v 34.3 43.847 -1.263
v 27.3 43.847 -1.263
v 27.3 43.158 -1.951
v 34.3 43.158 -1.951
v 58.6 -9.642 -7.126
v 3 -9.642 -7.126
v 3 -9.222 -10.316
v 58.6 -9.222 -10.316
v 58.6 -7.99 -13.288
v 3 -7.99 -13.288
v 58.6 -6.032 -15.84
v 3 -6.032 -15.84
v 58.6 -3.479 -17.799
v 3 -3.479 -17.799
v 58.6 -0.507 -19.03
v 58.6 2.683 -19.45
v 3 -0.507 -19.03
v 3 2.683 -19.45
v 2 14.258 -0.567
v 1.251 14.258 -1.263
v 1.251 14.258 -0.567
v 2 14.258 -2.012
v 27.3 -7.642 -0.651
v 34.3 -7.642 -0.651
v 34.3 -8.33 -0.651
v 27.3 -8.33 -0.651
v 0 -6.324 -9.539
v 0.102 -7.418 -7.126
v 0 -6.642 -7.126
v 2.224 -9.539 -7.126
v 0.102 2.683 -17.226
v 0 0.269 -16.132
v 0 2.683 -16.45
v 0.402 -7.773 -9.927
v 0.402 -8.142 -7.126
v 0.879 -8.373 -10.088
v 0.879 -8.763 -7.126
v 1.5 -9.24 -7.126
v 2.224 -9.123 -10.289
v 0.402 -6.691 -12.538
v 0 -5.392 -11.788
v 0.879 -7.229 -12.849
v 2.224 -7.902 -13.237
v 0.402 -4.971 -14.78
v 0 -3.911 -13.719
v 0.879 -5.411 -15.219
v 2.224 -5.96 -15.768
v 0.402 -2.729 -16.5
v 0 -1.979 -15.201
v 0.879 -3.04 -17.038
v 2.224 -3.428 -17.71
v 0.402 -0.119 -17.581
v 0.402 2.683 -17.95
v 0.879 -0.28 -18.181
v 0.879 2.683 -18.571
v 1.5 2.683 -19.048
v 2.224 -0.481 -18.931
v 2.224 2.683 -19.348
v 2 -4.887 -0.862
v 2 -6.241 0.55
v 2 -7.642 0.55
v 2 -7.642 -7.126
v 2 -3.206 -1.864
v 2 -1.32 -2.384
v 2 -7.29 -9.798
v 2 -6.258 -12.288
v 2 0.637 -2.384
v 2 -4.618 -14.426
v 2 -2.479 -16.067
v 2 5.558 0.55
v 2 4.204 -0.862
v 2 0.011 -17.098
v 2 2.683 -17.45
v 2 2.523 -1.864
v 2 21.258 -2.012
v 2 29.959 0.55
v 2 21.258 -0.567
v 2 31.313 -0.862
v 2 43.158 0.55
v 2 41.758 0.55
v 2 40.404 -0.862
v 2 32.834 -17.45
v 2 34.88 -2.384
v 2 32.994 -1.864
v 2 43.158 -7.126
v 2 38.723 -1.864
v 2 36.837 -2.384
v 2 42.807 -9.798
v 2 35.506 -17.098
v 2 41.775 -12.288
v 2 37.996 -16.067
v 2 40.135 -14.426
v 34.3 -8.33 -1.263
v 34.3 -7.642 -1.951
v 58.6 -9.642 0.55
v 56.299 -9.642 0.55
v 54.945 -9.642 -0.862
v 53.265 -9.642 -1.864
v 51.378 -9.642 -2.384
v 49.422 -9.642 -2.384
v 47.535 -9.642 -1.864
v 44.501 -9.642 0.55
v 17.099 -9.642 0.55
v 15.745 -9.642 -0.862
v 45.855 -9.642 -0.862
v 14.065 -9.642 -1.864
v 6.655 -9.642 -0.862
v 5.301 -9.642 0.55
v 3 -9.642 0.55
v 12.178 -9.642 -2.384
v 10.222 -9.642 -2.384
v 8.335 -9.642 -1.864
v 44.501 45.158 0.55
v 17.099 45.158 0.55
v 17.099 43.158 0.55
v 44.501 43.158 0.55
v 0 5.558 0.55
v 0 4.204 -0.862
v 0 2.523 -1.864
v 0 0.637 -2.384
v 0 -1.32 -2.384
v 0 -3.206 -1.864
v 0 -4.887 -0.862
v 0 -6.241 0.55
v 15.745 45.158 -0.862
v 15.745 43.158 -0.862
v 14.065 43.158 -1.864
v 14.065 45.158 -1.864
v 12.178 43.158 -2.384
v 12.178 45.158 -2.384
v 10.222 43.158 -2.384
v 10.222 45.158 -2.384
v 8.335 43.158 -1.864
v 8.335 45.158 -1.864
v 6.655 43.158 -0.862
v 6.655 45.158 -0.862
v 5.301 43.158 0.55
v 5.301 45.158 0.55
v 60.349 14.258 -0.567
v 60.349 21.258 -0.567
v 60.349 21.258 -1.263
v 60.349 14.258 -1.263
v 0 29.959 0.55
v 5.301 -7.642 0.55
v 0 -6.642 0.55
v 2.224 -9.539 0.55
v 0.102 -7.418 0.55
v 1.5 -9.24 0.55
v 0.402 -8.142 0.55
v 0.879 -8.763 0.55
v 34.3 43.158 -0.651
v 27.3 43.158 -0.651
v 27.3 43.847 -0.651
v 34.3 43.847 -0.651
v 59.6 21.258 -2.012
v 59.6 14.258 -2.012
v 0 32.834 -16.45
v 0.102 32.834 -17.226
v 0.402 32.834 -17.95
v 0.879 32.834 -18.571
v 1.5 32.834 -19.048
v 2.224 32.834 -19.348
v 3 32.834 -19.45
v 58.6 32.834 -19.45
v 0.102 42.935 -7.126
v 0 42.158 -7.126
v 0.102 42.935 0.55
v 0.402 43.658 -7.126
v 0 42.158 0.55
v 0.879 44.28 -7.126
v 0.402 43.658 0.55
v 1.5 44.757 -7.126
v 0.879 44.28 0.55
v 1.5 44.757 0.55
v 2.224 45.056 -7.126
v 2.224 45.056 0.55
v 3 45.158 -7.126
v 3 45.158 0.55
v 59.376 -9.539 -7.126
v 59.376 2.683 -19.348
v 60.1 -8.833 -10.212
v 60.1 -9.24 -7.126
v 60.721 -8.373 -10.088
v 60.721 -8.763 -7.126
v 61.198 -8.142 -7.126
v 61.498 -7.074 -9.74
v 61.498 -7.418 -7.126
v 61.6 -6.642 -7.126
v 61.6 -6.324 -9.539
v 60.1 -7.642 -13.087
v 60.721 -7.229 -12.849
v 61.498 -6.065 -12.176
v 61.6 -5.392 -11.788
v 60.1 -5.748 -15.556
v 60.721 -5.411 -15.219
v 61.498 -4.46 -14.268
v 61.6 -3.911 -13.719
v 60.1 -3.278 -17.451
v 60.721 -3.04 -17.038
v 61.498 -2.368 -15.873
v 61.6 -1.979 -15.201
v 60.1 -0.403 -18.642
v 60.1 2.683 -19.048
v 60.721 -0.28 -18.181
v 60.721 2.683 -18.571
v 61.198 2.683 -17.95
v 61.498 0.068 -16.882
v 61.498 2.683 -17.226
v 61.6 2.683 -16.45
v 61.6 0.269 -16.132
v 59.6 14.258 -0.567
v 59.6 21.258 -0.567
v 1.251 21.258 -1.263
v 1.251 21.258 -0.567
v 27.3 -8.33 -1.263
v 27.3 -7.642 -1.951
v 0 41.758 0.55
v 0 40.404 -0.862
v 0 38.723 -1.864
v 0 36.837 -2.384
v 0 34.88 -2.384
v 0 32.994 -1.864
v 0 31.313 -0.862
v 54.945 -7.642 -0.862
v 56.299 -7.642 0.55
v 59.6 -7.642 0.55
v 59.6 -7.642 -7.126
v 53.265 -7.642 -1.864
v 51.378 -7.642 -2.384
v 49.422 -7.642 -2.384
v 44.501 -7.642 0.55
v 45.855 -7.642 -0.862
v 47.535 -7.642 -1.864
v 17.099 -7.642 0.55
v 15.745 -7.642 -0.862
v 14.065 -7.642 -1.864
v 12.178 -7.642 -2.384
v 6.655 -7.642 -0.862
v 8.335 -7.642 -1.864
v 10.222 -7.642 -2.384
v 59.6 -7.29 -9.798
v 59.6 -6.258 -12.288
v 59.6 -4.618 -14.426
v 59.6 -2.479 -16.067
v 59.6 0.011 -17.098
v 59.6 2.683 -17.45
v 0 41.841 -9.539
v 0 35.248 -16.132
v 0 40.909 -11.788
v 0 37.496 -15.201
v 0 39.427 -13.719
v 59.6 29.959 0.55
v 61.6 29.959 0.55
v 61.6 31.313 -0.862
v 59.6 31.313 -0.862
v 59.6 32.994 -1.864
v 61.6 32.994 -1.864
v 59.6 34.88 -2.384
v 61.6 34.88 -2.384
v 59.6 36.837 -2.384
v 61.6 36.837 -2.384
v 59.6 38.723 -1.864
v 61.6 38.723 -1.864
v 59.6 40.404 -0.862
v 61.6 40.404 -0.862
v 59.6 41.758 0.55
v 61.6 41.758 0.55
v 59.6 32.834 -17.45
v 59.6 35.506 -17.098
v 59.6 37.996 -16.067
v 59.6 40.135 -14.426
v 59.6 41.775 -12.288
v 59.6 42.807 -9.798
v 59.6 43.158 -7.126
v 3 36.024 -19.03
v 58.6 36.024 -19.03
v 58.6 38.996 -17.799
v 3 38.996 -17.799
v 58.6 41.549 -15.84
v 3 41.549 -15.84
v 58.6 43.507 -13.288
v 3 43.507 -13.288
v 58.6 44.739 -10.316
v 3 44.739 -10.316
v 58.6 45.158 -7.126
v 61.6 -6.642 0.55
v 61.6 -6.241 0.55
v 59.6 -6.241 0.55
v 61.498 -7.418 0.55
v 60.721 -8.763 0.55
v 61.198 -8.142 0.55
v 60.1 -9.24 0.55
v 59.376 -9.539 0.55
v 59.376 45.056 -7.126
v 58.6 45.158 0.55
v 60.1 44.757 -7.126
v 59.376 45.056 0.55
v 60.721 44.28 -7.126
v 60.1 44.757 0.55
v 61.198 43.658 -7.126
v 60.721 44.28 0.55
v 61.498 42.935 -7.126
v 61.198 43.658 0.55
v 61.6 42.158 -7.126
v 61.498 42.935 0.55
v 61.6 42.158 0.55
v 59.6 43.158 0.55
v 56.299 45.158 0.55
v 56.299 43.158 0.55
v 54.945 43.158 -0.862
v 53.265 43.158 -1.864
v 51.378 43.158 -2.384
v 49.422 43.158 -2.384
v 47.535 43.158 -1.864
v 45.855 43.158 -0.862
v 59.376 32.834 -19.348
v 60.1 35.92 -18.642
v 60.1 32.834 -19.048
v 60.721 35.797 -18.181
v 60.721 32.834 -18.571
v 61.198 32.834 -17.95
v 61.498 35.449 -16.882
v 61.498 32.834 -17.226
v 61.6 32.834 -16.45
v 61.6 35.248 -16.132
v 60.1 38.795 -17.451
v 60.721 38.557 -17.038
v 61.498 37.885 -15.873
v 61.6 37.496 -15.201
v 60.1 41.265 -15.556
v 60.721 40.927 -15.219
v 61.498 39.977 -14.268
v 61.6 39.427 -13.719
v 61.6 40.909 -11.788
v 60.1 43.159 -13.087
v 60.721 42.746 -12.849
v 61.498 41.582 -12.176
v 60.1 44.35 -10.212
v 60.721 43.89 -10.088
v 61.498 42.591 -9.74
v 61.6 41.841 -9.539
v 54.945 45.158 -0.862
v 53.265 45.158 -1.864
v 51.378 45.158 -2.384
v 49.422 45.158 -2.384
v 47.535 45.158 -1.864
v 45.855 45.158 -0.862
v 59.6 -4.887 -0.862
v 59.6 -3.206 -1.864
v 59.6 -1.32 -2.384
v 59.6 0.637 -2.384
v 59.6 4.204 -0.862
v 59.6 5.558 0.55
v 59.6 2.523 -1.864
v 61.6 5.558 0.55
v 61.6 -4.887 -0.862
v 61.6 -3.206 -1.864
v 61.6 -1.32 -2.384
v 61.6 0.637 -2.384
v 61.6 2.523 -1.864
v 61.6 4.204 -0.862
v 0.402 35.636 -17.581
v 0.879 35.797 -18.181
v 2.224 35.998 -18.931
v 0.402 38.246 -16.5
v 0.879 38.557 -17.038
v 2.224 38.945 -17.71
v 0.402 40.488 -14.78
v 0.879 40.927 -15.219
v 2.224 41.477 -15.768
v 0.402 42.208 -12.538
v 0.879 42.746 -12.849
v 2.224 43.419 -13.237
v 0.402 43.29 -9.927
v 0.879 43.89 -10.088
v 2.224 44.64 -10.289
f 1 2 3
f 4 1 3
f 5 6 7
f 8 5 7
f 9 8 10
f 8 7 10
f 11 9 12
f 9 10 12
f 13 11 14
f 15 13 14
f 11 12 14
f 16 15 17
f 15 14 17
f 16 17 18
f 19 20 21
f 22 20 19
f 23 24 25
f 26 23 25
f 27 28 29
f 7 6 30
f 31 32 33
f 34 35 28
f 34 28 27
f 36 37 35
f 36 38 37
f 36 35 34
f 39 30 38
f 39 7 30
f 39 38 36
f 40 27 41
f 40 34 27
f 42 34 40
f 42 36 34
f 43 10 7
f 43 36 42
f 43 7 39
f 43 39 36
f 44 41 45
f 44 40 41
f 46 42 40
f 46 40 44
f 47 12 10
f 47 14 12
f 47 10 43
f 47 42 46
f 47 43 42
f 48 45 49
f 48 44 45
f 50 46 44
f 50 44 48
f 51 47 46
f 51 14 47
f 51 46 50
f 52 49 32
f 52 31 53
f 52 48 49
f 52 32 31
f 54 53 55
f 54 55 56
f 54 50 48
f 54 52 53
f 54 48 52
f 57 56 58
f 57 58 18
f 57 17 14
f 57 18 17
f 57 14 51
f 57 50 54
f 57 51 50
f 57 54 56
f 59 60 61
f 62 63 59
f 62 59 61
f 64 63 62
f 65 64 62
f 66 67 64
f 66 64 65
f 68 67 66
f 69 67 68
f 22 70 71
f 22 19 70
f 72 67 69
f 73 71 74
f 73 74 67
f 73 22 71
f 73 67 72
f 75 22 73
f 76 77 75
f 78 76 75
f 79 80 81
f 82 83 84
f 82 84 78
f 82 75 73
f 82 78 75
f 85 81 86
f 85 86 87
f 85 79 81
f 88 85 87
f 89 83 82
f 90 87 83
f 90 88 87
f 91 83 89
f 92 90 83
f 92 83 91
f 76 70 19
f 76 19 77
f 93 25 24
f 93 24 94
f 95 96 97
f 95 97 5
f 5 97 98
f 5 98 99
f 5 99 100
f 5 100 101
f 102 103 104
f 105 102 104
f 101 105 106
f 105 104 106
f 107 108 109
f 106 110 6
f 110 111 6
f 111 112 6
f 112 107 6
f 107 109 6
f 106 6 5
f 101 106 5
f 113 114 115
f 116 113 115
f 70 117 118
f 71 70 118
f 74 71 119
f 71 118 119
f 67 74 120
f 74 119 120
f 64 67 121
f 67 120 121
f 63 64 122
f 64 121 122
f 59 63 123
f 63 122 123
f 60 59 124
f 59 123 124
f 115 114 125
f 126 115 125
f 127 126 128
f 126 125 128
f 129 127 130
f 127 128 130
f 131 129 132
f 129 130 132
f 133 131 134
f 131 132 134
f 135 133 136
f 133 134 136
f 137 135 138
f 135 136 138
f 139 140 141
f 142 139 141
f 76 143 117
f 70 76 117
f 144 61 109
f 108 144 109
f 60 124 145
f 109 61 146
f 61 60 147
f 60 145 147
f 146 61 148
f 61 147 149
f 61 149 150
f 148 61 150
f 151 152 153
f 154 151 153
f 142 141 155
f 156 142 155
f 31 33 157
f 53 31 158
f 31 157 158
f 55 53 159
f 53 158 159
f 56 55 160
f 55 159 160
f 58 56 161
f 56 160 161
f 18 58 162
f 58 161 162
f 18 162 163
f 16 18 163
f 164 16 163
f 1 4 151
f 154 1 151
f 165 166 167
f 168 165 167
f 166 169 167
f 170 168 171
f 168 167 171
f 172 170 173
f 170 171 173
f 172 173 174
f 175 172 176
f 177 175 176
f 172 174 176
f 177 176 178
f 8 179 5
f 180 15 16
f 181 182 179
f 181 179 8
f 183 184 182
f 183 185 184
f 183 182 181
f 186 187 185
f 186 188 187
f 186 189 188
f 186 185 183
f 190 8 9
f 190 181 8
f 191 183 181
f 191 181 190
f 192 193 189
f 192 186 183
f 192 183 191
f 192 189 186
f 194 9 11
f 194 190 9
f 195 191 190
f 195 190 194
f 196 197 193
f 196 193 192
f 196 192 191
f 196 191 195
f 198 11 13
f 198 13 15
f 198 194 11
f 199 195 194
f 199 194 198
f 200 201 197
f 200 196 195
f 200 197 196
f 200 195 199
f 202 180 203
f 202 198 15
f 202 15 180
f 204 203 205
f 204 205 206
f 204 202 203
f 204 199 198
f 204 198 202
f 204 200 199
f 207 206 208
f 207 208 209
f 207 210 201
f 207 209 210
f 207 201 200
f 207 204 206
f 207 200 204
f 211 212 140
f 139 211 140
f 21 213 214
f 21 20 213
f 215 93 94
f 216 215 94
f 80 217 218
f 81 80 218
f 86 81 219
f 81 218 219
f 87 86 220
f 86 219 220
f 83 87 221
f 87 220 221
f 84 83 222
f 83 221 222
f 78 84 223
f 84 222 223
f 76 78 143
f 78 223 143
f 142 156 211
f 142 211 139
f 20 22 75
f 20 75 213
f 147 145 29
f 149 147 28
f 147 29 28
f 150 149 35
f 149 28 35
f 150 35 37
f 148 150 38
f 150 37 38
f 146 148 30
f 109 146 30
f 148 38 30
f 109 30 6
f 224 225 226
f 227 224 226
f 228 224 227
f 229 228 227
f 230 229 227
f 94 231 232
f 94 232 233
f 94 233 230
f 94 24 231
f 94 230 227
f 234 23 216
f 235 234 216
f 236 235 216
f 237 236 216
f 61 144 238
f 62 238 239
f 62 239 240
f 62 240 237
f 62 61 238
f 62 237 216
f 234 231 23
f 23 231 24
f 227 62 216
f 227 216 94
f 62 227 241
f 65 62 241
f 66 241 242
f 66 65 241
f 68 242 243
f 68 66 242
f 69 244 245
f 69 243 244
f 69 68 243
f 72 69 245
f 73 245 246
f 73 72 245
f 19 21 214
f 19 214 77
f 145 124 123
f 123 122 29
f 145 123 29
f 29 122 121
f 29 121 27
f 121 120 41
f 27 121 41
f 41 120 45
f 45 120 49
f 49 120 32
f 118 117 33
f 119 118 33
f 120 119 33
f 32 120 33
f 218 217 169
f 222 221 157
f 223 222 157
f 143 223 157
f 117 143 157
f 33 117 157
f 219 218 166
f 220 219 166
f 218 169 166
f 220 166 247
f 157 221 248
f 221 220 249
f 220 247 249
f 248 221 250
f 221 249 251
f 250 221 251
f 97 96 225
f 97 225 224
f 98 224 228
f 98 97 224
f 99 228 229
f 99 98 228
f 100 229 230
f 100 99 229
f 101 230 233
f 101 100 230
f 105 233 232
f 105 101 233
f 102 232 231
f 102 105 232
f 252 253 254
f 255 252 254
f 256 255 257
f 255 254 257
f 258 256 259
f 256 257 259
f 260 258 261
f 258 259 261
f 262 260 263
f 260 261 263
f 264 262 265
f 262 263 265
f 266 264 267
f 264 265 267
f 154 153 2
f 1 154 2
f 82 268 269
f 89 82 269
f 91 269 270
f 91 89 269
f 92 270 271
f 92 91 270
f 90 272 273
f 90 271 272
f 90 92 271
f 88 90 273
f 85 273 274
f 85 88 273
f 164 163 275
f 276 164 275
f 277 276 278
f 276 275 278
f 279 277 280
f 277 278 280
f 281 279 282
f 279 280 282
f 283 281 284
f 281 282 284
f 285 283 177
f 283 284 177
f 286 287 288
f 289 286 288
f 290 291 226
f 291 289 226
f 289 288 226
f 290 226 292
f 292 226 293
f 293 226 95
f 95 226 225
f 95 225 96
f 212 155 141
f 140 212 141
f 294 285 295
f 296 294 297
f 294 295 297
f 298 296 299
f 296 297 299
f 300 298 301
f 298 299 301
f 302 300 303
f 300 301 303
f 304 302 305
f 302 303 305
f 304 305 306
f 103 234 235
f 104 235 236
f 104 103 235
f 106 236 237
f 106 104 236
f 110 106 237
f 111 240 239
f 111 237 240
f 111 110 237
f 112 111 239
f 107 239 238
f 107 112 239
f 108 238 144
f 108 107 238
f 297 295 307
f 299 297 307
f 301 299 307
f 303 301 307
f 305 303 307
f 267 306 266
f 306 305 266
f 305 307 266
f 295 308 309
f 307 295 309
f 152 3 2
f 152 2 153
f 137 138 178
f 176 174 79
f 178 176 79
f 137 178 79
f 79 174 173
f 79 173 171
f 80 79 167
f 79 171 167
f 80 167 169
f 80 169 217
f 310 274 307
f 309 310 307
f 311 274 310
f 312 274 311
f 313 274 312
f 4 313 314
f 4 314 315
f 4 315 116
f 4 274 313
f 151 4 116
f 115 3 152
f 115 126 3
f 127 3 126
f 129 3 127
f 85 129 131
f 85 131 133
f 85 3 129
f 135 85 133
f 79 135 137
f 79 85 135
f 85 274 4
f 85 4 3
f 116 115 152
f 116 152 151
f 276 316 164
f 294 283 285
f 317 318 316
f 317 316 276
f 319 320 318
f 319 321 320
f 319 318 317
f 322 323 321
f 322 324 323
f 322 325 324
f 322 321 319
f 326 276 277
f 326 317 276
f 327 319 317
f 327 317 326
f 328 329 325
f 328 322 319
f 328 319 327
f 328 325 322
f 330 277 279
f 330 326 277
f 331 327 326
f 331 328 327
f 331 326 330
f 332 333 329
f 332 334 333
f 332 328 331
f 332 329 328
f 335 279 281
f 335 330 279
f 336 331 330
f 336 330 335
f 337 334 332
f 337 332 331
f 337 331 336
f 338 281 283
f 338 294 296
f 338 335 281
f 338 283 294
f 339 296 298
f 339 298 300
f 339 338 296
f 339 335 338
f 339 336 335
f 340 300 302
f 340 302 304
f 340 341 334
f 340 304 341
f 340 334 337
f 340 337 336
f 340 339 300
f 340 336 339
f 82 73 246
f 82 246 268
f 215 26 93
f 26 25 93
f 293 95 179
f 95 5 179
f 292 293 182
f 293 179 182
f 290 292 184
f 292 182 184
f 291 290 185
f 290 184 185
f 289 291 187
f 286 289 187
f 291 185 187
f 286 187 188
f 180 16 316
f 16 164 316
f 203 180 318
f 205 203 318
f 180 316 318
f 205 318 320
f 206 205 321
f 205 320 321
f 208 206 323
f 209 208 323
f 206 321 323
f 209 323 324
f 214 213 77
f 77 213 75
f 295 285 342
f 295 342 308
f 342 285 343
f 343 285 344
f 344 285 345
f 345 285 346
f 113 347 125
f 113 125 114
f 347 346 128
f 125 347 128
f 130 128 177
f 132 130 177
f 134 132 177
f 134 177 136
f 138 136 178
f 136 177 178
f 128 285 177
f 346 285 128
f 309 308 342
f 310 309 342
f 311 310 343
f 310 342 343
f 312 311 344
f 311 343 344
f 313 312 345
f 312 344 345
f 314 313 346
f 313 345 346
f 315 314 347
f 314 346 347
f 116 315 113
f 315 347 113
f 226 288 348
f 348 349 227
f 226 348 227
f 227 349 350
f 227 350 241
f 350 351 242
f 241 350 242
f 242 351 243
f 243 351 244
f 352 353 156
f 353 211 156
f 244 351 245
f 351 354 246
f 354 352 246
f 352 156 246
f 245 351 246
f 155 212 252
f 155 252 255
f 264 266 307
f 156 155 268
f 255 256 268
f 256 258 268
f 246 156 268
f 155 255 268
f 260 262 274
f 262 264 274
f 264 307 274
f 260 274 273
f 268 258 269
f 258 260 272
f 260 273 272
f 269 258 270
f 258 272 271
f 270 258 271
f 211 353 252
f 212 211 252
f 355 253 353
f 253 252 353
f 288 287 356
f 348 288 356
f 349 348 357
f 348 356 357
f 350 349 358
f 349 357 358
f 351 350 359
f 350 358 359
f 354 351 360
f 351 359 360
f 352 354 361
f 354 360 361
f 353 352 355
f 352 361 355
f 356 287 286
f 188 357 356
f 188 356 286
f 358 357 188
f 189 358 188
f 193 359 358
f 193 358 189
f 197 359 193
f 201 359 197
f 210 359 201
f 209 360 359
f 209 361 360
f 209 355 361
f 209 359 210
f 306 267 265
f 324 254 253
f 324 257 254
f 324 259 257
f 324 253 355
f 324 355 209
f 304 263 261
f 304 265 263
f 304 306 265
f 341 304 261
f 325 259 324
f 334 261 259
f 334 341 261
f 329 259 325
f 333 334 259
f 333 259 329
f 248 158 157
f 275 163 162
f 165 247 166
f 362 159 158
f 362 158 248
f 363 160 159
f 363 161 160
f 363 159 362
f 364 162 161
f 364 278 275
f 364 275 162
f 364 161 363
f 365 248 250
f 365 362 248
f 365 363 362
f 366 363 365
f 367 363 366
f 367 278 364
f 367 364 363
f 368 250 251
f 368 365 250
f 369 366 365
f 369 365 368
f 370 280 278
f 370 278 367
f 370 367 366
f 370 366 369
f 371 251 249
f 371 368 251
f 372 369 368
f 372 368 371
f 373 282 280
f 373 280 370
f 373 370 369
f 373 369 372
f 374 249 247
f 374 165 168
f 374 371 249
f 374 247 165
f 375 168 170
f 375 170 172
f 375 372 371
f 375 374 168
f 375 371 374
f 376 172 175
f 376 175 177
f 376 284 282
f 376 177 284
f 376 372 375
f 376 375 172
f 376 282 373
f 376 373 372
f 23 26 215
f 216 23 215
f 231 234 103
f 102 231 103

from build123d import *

# Parameters (mm, degrees)
EXTRUDE_1_DEPTH      = 61.6
SHELL_1_T            = -2
CUT_EXTRUDE_8_DEPTH  = 3.5
CUT_EXTRUDE_9_REACH  = 80.817
CUT_EXTRUDE_10_REACH = 80.817
CUT_EXTRUDE_11_REACH = 86.711
CUT_EXTRUDE_12_REACH = 86.711
CUT_EXTRUDE_13_DEPTH = 3.5
FILLET_1_R           = 3
FILLET_2_R           = 3


with BuildPart() as part:
    # ｽｹｯﾁ2 → ﾎﾞｽ - 押し出し1 (new body)
    with BuildSketch(Plane(origin=(0, 0, 0), x_dir=(0, 0, -1), z_dir=(1, 0, 0))):
        with BuildLine():
            Line((7.125790142, 45.158487371), (-0.55, 45.158487371))
            Line((-0.55, 45.158487371), (-0.55, -9.641512629))
            Line((-0.55, -9.641512629), (7.125790142, -9.641512629))
            ThreePointArc((7.125790142, -9.641512629), (15.840322505, -6.031835134), (19.45, 2.682697229))
            Line((19.45, 2.682697229), (19.45, 32.834277513))
            ThreePointArc((19.45, 32.834277513), (15.840322505, 41.548809876), (7.125790142, 45.158487371))
        make_face()
    extrude(amount=EXTRUDE_1_DEPTH)

    # ｼｪﾙ1
    shell_1_openings = [part.faces().sort_by_distance(p)[0] for p in [
        (30.8, 17.758487371, 0.55),
    ]]
    offset(amount=SHELL_1_T, openings=shell_1_openings, kind=Kind.INTERSECTION)

    # ｽｹｯﾁ11 → ｶｯﾄ - 押し出し8 (cut, symmetric)
    with BuildSketch(Plane(origin=(0, 17.758487371, 0), x_dir=(1, 0, 0), z_dir=(0, 1, 0))):
        Polygon((2.16, 2.171540251), (1.251335836, 1.262876087), (1.251335836, 0.566601917), (2.16, 0.566601917), align=None)
        Polygon((59.44, 2.171540251), (59.44, 0.566601917), (60.348664164, 0.566601917), (60.348664164, 1.262876087), align=None)
    extrude(amount=CUT_EXTRUDE_8_DEPTH, both=True, mode=Mode.SUBTRACT)

    # ｽｹｯﾁ12 → ｶｯﾄ - 押し出し9 (cut, up to next)
    with BuildSketch(Plane(origin=(61.6, 0, 0), x_dir=(0, 0, -1), z_dir=(1, 0, 0)), mode=Mode.PRIVATE) as cut_extrude_9_sk1:
        with BuildLine():
            Line((-0.55, 41.757639853), (-0.55, 29.95933489))
            ThreePointArc((-0.55, 29.95933489), (2.45, 35.858487371), (-0.55, 41.757639853))
        make_face()
    cut_extrude_9_tool1 = extrude(cut_extrude_9_sk1.sketch, amount=-CUT_EXTRUDE_9_REACH, mode=Mode.PRIVATE) & part.part
    # ｽｹｯﾁ12 → ｶｯﾄ - 押し出し9 (cut, up to next)
    with BuildSketch(Plane(origin=(61.6, 0, 0), x_dir=(0, 0, -1), z_dir=(1, 0, 0)), mode=Mode.PRIVATE) as cut_extrude_9_sk2:
        with BuildLine():
            Line((-0.55, 5.557639853), (-0.55, -6.24066511))
            ThreePointArc((-0.55, -6.24066511), (2.45, -0.341512629), (-0.55, 5.557639853))
        make_face()
    cut_extrude_9_tool2 = extrude(cut_extrude_9_sk2.sketch, amount=-CUT_EXTRUDE_9_REACH, mode=Mode.PRIVATE) & part.part
    add(cut_extrude_9_tool1.solids().sort_by_distance((61.6, 35.858487, -0.674015))[0], mode=Mode.SUBTRACT)
    add(cut_extrude_9_tool2.solids().sort_by_distance((61.6, -0.341513, -0.674015))[0], mode=Mode.SUBTRACT)

    # ｽｹｯﾁ13 → ｶｯﾄ - 押し出し10 (cut, up to next)
    with BuildSketch(Plane.ZY, mode=Mode.PRIVATE) as cut_extrude_10_sk1:
        with BuildLine():
            Line((0.55, 29.95933489), (0.55, 41.757639853))
            ThreePointArc((0.55, 41.757639853), (-2.45, 35.858487371), (0.55, 29.95933489))
        make_face()
    cut_extrude_10_tool1 = extrude(cut_extrude_10_sk1.sketch, amount=-CUT_EXTRUDE_10_REACH, mode=Mode.PRIVATE) & part.part
    # ｽｹｯﾁ13 → ｶｯﾄ - 押し出し10 (cut, up to next)
    with BuildSketch(Plane.ZY, mode=Mode.PRIVATE) as cut_extrude_10_sk2:
        with BuildLine():
            Line((0.55, -6.24066511), (0.55, 5.557639853))
            ThreePointArc((0.55, 5.557639853), (-2.45, -0.341512629), (0.55, -6.24066511))
        make_face()
    cut_extrude_10_tool2 = extrude(cut_extrude_10_sk2.sketch, amount=-CUT_EXTRUDE_10_REACH, mode=Mode.PRIVATE) & part.part
    add(cut_extrude_10_tool1.solids().sort_by_distance((0, 35.858487, -0.674015))[0], mode=Mode.SUBTRACT)
    add(cut_extrude_10_tool2.solids().sort_by_distance((0, -0.341513, -0.674015))[0], mode=Mode.SUBTRACT)

    # ｽｹｯﾁ14 → ｶｯﾄ - 押し出し11 (cut, up to next)
    with BuildSketch(Plane.XZ.offset(9.641512629), mode=Mode.PRIVATE) as cut_extrude_11_sk1:
        with BuildLine():
            Line((5.300847518, 0.55), (17.099152482, 0.55))
            ThreePointArc((17.099152482, 0.55), (11.2, -2.45), (5.300847518, 0.55))
        make_face()
    cut_extrude_11_tool1 = extrude(cut_extrude_11_sk1.sketch, amount=-CUT_EXTRUDE_11_REACH, mode=Mode.PRIVATE) & part.part
    # ｽｹｯﾁ14 → ｶｯﾄ - 押し出し11 (cut, up to next)
    with BuildSketch(Plane.XZ.offset(9.641512629), mode=Mode.PRIVATE) as cut_extrude_11_sk2:
        with BuildLine():
            Line((44.500847518, 0.55), (56.299152482, 0.55))
            ThreePointArc((56.299152482, 0.55), (50.4, -2.45), (44.500847518, 0.55))
        make_face()
    cut_extrude_11_tool2 = extrude(cut_extrude_11_sk2.sketch, amount=-CUT_EXTRUDE_11_REACH, mode=Mode.PRIVATE) & part.part
    add(cut_extrude_11_tool1.solids().sort_by_distance((11.2, -9.641513, -0.674015))[0], mode=Mode.SUBTRACT)
    add(cut_extrude_11_tool2.solids().sort_by_distance((50.4, -9.641513, -0.674015))[0], mode=Mode.SUBTRACT)

    # ｽｹｯﾁ15 → ｶｯﾄ - 押し出し12 (cut, up to next)
    with BuildSketch(Plane(origin=(0, 45.158487371, 0), x_dir=(1, 0, 0), z_dir=(0, 1, 0)), mode=Mode.PRIVATE) as cut_extrude_12_sk1:
        with BuildLine():
            Line((44.500847518, -0.55), (56.299152482, -0.55))
            ThreePointArc((56.299152482, -0.55), (50.4, 2.45), (44.500847518, -0.55))
        make_face()
    cut_extrude_12_tool1 = extrude(cut_extrude_12_sk1.sketch, amount=-CUT_EXTRUDE_12_REACH, mode=Mode.PRIVATE) & part.part
    # ｽｹｯﾁ15 → ｶｯﾄ - 押し出し12 (cut, up to next)
    with BuildSketch(Plane(origin=(0, 45.158487371, 0), x_dir=(1, 0, 0), z_dir=(0, 1, 0)), mode=Mode.PRIVATE) as cut_extrude_12_sk2:
        with BuildLine():
            Line((5.300847518, -0.55), (17.099152482, -0.55))
            ThreePointArc((17.099152482, -0.55), (11.2, 2.45), (5.300847518, -0.55))
        make_face()
    cut_extrude_12_tool2 = extrude(cut_extrude_12_sk2.sketch, amount=-CUT_EXTRUDE_12_REACH, mode=Mode.PRIVATE) & part.part
    add(cut_extrude_12_tool1.solids().sort_by_distance((50.4, 45.158487, -0.674015))[0], mode=Mode.SUBTRACT)
    add(cut_extrude_12_tool2.solids().sort_by_distance((11.2, 45.158487, -0.674015))[0], mode=Mode.SUBTRACT)

    # ｽｹｯﾁ16 → ｶｯﾄ - 押し出し13 (cut, symmetric)
    with BuildSketch(Plane(origin=(30.8, 0, 0), x_dir=(0, 0, -1), z_dir=(1, 0, 0))):
        Polygon((2.051421356, 43.058487371), (0.651335836, 43.058487371), (0.651335836, 43.847151535), (1.262757192, 43.847151535), align=None)
        Polygon((1.262757192, -8.330176793), (2.051421356, -7.541512629), (0.651335836, -7.541512629), (0.651335836, -8.330176793), align=None)
    extrude(amount=CUT_EXTRUDE_13_DEPTH, both=True, mode=Mode.SUBTRACT)

    # ﾌｨﾚｯﾄ1
    fillet_1_edges = [part.edges().sort_by_distance(p)[0] for p in [
        (61.6, -6.031835134, -15.840322505),
        (61.6, 17.758487371, -19.45),
        (61.6, 41.548809876, -15.840322505),
        (61.6, 45.158487371, -3.287895071),
        (61.6, -9.641512629, -3.287895071),
    ]]
    fillet(fillet_1_edges, radius=FILLET_1_R)

    # ﾌｨﾚｯﾄ2
    fillet_2_edges = [part.edges().sort_by_distance(p)[0] for p in [
        (0, 45.158487371, -3.287895071),
        (0, 41.548809876, -15.840322505),
        (0, 17.758487371, -19.45),
        (0, -6.031835134, -15.840322505),
        (0, -9.641512629, -3.287895071),
    ]]
    fillet(fillet_2_edges, radius=FILLET_2_R)


solid = part.part
